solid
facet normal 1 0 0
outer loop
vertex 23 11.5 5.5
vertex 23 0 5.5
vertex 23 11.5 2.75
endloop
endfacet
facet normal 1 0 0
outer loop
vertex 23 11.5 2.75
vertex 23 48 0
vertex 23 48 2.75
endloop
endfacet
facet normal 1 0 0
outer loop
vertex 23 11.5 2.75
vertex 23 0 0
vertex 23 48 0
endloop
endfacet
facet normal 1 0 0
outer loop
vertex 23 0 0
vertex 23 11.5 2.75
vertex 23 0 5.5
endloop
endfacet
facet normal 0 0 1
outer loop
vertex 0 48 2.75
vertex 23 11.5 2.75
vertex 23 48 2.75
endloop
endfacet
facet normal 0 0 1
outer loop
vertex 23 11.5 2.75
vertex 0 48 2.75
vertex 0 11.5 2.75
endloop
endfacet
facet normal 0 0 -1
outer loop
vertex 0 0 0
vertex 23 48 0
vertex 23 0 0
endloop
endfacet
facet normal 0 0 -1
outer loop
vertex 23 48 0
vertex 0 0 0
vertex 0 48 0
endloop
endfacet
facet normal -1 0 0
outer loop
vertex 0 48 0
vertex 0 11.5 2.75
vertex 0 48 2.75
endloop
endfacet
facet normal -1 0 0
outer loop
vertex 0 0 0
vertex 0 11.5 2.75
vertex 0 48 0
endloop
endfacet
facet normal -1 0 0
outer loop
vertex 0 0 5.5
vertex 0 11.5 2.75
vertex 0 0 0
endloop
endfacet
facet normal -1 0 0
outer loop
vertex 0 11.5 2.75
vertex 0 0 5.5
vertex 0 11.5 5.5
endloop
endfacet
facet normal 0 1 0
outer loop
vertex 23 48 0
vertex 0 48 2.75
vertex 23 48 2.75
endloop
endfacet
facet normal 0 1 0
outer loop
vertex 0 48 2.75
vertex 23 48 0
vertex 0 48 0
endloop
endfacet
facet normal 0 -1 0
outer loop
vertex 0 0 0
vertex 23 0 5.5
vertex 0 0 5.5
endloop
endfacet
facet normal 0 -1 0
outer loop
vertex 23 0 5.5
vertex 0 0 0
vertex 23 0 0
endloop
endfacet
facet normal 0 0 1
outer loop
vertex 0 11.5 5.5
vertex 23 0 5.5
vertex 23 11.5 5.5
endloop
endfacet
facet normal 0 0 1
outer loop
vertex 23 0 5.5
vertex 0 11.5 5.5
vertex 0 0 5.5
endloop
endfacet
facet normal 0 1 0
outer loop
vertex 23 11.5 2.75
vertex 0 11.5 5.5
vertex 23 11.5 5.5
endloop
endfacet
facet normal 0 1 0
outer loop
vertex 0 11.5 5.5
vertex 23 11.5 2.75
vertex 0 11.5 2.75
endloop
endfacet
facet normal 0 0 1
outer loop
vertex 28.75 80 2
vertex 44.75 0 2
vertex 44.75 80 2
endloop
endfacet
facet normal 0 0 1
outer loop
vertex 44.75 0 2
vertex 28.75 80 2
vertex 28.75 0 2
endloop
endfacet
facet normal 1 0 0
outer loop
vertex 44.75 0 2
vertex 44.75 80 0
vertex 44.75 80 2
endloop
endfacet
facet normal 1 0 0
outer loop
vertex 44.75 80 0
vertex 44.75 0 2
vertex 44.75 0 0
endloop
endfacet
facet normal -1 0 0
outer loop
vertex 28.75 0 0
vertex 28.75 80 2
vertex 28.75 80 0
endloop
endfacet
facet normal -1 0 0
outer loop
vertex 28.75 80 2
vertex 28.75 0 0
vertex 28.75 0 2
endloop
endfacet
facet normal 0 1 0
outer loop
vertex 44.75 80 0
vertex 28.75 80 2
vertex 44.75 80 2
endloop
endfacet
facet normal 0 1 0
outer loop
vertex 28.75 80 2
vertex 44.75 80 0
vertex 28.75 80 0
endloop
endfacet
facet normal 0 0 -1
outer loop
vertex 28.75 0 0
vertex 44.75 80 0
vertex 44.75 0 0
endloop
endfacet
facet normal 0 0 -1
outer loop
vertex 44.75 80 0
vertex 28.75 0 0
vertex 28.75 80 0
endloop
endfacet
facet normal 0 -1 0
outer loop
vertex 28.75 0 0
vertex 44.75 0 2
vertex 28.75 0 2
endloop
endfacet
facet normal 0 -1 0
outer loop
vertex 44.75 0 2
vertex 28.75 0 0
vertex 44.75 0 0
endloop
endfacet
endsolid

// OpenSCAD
BASE_WIDTH=23;
BASE_LENGTH=48;
BASE_THICKNESS=2.75;

ARM_WIDTH=16;
ARM_LENGTH=80;
ARM_THICKNESS=2;

HOLE_RADIUS=ARM_WIDTH*0.4;

module drawBaseBottom()
{
	cube([BASE_WIDTH,BASE_LENGTH,BASE_THICKNESS]);
	translate([0,0,BASE_THICKNESS])
	cube([BASE_WIDTH,BASE_WIDTH/2,BASE_THICKNESS]);
}

module drawBase()
{
	difference()
	{
		drawBaseBottom();

		translate( [BASE_WIDTH/4,BASE_WIDTH/2,0] )
		rotate( [0,0,45] )
		% cube( [ARM_WIDTH, BASE_THICKNESS*3, ARM_THICKNESS ] );
	}
}

module drawArm()
{
	difference()
	{
		cube([ARM_WIDTH,ARM_LENGTH,ARM_THICKNESS]);

		translate( [ARM_WIDTH/2,ARM_LENGTH*0.8-HOLE_RADIUS,0])
		% cylinder( ARM_THICKNESS*2, HOLE_RADIUS, HOLE_RADIUS  );
	}
}

drawBase();
translate([BASE_WIDTH*1.25,0,0])
drawArm();
